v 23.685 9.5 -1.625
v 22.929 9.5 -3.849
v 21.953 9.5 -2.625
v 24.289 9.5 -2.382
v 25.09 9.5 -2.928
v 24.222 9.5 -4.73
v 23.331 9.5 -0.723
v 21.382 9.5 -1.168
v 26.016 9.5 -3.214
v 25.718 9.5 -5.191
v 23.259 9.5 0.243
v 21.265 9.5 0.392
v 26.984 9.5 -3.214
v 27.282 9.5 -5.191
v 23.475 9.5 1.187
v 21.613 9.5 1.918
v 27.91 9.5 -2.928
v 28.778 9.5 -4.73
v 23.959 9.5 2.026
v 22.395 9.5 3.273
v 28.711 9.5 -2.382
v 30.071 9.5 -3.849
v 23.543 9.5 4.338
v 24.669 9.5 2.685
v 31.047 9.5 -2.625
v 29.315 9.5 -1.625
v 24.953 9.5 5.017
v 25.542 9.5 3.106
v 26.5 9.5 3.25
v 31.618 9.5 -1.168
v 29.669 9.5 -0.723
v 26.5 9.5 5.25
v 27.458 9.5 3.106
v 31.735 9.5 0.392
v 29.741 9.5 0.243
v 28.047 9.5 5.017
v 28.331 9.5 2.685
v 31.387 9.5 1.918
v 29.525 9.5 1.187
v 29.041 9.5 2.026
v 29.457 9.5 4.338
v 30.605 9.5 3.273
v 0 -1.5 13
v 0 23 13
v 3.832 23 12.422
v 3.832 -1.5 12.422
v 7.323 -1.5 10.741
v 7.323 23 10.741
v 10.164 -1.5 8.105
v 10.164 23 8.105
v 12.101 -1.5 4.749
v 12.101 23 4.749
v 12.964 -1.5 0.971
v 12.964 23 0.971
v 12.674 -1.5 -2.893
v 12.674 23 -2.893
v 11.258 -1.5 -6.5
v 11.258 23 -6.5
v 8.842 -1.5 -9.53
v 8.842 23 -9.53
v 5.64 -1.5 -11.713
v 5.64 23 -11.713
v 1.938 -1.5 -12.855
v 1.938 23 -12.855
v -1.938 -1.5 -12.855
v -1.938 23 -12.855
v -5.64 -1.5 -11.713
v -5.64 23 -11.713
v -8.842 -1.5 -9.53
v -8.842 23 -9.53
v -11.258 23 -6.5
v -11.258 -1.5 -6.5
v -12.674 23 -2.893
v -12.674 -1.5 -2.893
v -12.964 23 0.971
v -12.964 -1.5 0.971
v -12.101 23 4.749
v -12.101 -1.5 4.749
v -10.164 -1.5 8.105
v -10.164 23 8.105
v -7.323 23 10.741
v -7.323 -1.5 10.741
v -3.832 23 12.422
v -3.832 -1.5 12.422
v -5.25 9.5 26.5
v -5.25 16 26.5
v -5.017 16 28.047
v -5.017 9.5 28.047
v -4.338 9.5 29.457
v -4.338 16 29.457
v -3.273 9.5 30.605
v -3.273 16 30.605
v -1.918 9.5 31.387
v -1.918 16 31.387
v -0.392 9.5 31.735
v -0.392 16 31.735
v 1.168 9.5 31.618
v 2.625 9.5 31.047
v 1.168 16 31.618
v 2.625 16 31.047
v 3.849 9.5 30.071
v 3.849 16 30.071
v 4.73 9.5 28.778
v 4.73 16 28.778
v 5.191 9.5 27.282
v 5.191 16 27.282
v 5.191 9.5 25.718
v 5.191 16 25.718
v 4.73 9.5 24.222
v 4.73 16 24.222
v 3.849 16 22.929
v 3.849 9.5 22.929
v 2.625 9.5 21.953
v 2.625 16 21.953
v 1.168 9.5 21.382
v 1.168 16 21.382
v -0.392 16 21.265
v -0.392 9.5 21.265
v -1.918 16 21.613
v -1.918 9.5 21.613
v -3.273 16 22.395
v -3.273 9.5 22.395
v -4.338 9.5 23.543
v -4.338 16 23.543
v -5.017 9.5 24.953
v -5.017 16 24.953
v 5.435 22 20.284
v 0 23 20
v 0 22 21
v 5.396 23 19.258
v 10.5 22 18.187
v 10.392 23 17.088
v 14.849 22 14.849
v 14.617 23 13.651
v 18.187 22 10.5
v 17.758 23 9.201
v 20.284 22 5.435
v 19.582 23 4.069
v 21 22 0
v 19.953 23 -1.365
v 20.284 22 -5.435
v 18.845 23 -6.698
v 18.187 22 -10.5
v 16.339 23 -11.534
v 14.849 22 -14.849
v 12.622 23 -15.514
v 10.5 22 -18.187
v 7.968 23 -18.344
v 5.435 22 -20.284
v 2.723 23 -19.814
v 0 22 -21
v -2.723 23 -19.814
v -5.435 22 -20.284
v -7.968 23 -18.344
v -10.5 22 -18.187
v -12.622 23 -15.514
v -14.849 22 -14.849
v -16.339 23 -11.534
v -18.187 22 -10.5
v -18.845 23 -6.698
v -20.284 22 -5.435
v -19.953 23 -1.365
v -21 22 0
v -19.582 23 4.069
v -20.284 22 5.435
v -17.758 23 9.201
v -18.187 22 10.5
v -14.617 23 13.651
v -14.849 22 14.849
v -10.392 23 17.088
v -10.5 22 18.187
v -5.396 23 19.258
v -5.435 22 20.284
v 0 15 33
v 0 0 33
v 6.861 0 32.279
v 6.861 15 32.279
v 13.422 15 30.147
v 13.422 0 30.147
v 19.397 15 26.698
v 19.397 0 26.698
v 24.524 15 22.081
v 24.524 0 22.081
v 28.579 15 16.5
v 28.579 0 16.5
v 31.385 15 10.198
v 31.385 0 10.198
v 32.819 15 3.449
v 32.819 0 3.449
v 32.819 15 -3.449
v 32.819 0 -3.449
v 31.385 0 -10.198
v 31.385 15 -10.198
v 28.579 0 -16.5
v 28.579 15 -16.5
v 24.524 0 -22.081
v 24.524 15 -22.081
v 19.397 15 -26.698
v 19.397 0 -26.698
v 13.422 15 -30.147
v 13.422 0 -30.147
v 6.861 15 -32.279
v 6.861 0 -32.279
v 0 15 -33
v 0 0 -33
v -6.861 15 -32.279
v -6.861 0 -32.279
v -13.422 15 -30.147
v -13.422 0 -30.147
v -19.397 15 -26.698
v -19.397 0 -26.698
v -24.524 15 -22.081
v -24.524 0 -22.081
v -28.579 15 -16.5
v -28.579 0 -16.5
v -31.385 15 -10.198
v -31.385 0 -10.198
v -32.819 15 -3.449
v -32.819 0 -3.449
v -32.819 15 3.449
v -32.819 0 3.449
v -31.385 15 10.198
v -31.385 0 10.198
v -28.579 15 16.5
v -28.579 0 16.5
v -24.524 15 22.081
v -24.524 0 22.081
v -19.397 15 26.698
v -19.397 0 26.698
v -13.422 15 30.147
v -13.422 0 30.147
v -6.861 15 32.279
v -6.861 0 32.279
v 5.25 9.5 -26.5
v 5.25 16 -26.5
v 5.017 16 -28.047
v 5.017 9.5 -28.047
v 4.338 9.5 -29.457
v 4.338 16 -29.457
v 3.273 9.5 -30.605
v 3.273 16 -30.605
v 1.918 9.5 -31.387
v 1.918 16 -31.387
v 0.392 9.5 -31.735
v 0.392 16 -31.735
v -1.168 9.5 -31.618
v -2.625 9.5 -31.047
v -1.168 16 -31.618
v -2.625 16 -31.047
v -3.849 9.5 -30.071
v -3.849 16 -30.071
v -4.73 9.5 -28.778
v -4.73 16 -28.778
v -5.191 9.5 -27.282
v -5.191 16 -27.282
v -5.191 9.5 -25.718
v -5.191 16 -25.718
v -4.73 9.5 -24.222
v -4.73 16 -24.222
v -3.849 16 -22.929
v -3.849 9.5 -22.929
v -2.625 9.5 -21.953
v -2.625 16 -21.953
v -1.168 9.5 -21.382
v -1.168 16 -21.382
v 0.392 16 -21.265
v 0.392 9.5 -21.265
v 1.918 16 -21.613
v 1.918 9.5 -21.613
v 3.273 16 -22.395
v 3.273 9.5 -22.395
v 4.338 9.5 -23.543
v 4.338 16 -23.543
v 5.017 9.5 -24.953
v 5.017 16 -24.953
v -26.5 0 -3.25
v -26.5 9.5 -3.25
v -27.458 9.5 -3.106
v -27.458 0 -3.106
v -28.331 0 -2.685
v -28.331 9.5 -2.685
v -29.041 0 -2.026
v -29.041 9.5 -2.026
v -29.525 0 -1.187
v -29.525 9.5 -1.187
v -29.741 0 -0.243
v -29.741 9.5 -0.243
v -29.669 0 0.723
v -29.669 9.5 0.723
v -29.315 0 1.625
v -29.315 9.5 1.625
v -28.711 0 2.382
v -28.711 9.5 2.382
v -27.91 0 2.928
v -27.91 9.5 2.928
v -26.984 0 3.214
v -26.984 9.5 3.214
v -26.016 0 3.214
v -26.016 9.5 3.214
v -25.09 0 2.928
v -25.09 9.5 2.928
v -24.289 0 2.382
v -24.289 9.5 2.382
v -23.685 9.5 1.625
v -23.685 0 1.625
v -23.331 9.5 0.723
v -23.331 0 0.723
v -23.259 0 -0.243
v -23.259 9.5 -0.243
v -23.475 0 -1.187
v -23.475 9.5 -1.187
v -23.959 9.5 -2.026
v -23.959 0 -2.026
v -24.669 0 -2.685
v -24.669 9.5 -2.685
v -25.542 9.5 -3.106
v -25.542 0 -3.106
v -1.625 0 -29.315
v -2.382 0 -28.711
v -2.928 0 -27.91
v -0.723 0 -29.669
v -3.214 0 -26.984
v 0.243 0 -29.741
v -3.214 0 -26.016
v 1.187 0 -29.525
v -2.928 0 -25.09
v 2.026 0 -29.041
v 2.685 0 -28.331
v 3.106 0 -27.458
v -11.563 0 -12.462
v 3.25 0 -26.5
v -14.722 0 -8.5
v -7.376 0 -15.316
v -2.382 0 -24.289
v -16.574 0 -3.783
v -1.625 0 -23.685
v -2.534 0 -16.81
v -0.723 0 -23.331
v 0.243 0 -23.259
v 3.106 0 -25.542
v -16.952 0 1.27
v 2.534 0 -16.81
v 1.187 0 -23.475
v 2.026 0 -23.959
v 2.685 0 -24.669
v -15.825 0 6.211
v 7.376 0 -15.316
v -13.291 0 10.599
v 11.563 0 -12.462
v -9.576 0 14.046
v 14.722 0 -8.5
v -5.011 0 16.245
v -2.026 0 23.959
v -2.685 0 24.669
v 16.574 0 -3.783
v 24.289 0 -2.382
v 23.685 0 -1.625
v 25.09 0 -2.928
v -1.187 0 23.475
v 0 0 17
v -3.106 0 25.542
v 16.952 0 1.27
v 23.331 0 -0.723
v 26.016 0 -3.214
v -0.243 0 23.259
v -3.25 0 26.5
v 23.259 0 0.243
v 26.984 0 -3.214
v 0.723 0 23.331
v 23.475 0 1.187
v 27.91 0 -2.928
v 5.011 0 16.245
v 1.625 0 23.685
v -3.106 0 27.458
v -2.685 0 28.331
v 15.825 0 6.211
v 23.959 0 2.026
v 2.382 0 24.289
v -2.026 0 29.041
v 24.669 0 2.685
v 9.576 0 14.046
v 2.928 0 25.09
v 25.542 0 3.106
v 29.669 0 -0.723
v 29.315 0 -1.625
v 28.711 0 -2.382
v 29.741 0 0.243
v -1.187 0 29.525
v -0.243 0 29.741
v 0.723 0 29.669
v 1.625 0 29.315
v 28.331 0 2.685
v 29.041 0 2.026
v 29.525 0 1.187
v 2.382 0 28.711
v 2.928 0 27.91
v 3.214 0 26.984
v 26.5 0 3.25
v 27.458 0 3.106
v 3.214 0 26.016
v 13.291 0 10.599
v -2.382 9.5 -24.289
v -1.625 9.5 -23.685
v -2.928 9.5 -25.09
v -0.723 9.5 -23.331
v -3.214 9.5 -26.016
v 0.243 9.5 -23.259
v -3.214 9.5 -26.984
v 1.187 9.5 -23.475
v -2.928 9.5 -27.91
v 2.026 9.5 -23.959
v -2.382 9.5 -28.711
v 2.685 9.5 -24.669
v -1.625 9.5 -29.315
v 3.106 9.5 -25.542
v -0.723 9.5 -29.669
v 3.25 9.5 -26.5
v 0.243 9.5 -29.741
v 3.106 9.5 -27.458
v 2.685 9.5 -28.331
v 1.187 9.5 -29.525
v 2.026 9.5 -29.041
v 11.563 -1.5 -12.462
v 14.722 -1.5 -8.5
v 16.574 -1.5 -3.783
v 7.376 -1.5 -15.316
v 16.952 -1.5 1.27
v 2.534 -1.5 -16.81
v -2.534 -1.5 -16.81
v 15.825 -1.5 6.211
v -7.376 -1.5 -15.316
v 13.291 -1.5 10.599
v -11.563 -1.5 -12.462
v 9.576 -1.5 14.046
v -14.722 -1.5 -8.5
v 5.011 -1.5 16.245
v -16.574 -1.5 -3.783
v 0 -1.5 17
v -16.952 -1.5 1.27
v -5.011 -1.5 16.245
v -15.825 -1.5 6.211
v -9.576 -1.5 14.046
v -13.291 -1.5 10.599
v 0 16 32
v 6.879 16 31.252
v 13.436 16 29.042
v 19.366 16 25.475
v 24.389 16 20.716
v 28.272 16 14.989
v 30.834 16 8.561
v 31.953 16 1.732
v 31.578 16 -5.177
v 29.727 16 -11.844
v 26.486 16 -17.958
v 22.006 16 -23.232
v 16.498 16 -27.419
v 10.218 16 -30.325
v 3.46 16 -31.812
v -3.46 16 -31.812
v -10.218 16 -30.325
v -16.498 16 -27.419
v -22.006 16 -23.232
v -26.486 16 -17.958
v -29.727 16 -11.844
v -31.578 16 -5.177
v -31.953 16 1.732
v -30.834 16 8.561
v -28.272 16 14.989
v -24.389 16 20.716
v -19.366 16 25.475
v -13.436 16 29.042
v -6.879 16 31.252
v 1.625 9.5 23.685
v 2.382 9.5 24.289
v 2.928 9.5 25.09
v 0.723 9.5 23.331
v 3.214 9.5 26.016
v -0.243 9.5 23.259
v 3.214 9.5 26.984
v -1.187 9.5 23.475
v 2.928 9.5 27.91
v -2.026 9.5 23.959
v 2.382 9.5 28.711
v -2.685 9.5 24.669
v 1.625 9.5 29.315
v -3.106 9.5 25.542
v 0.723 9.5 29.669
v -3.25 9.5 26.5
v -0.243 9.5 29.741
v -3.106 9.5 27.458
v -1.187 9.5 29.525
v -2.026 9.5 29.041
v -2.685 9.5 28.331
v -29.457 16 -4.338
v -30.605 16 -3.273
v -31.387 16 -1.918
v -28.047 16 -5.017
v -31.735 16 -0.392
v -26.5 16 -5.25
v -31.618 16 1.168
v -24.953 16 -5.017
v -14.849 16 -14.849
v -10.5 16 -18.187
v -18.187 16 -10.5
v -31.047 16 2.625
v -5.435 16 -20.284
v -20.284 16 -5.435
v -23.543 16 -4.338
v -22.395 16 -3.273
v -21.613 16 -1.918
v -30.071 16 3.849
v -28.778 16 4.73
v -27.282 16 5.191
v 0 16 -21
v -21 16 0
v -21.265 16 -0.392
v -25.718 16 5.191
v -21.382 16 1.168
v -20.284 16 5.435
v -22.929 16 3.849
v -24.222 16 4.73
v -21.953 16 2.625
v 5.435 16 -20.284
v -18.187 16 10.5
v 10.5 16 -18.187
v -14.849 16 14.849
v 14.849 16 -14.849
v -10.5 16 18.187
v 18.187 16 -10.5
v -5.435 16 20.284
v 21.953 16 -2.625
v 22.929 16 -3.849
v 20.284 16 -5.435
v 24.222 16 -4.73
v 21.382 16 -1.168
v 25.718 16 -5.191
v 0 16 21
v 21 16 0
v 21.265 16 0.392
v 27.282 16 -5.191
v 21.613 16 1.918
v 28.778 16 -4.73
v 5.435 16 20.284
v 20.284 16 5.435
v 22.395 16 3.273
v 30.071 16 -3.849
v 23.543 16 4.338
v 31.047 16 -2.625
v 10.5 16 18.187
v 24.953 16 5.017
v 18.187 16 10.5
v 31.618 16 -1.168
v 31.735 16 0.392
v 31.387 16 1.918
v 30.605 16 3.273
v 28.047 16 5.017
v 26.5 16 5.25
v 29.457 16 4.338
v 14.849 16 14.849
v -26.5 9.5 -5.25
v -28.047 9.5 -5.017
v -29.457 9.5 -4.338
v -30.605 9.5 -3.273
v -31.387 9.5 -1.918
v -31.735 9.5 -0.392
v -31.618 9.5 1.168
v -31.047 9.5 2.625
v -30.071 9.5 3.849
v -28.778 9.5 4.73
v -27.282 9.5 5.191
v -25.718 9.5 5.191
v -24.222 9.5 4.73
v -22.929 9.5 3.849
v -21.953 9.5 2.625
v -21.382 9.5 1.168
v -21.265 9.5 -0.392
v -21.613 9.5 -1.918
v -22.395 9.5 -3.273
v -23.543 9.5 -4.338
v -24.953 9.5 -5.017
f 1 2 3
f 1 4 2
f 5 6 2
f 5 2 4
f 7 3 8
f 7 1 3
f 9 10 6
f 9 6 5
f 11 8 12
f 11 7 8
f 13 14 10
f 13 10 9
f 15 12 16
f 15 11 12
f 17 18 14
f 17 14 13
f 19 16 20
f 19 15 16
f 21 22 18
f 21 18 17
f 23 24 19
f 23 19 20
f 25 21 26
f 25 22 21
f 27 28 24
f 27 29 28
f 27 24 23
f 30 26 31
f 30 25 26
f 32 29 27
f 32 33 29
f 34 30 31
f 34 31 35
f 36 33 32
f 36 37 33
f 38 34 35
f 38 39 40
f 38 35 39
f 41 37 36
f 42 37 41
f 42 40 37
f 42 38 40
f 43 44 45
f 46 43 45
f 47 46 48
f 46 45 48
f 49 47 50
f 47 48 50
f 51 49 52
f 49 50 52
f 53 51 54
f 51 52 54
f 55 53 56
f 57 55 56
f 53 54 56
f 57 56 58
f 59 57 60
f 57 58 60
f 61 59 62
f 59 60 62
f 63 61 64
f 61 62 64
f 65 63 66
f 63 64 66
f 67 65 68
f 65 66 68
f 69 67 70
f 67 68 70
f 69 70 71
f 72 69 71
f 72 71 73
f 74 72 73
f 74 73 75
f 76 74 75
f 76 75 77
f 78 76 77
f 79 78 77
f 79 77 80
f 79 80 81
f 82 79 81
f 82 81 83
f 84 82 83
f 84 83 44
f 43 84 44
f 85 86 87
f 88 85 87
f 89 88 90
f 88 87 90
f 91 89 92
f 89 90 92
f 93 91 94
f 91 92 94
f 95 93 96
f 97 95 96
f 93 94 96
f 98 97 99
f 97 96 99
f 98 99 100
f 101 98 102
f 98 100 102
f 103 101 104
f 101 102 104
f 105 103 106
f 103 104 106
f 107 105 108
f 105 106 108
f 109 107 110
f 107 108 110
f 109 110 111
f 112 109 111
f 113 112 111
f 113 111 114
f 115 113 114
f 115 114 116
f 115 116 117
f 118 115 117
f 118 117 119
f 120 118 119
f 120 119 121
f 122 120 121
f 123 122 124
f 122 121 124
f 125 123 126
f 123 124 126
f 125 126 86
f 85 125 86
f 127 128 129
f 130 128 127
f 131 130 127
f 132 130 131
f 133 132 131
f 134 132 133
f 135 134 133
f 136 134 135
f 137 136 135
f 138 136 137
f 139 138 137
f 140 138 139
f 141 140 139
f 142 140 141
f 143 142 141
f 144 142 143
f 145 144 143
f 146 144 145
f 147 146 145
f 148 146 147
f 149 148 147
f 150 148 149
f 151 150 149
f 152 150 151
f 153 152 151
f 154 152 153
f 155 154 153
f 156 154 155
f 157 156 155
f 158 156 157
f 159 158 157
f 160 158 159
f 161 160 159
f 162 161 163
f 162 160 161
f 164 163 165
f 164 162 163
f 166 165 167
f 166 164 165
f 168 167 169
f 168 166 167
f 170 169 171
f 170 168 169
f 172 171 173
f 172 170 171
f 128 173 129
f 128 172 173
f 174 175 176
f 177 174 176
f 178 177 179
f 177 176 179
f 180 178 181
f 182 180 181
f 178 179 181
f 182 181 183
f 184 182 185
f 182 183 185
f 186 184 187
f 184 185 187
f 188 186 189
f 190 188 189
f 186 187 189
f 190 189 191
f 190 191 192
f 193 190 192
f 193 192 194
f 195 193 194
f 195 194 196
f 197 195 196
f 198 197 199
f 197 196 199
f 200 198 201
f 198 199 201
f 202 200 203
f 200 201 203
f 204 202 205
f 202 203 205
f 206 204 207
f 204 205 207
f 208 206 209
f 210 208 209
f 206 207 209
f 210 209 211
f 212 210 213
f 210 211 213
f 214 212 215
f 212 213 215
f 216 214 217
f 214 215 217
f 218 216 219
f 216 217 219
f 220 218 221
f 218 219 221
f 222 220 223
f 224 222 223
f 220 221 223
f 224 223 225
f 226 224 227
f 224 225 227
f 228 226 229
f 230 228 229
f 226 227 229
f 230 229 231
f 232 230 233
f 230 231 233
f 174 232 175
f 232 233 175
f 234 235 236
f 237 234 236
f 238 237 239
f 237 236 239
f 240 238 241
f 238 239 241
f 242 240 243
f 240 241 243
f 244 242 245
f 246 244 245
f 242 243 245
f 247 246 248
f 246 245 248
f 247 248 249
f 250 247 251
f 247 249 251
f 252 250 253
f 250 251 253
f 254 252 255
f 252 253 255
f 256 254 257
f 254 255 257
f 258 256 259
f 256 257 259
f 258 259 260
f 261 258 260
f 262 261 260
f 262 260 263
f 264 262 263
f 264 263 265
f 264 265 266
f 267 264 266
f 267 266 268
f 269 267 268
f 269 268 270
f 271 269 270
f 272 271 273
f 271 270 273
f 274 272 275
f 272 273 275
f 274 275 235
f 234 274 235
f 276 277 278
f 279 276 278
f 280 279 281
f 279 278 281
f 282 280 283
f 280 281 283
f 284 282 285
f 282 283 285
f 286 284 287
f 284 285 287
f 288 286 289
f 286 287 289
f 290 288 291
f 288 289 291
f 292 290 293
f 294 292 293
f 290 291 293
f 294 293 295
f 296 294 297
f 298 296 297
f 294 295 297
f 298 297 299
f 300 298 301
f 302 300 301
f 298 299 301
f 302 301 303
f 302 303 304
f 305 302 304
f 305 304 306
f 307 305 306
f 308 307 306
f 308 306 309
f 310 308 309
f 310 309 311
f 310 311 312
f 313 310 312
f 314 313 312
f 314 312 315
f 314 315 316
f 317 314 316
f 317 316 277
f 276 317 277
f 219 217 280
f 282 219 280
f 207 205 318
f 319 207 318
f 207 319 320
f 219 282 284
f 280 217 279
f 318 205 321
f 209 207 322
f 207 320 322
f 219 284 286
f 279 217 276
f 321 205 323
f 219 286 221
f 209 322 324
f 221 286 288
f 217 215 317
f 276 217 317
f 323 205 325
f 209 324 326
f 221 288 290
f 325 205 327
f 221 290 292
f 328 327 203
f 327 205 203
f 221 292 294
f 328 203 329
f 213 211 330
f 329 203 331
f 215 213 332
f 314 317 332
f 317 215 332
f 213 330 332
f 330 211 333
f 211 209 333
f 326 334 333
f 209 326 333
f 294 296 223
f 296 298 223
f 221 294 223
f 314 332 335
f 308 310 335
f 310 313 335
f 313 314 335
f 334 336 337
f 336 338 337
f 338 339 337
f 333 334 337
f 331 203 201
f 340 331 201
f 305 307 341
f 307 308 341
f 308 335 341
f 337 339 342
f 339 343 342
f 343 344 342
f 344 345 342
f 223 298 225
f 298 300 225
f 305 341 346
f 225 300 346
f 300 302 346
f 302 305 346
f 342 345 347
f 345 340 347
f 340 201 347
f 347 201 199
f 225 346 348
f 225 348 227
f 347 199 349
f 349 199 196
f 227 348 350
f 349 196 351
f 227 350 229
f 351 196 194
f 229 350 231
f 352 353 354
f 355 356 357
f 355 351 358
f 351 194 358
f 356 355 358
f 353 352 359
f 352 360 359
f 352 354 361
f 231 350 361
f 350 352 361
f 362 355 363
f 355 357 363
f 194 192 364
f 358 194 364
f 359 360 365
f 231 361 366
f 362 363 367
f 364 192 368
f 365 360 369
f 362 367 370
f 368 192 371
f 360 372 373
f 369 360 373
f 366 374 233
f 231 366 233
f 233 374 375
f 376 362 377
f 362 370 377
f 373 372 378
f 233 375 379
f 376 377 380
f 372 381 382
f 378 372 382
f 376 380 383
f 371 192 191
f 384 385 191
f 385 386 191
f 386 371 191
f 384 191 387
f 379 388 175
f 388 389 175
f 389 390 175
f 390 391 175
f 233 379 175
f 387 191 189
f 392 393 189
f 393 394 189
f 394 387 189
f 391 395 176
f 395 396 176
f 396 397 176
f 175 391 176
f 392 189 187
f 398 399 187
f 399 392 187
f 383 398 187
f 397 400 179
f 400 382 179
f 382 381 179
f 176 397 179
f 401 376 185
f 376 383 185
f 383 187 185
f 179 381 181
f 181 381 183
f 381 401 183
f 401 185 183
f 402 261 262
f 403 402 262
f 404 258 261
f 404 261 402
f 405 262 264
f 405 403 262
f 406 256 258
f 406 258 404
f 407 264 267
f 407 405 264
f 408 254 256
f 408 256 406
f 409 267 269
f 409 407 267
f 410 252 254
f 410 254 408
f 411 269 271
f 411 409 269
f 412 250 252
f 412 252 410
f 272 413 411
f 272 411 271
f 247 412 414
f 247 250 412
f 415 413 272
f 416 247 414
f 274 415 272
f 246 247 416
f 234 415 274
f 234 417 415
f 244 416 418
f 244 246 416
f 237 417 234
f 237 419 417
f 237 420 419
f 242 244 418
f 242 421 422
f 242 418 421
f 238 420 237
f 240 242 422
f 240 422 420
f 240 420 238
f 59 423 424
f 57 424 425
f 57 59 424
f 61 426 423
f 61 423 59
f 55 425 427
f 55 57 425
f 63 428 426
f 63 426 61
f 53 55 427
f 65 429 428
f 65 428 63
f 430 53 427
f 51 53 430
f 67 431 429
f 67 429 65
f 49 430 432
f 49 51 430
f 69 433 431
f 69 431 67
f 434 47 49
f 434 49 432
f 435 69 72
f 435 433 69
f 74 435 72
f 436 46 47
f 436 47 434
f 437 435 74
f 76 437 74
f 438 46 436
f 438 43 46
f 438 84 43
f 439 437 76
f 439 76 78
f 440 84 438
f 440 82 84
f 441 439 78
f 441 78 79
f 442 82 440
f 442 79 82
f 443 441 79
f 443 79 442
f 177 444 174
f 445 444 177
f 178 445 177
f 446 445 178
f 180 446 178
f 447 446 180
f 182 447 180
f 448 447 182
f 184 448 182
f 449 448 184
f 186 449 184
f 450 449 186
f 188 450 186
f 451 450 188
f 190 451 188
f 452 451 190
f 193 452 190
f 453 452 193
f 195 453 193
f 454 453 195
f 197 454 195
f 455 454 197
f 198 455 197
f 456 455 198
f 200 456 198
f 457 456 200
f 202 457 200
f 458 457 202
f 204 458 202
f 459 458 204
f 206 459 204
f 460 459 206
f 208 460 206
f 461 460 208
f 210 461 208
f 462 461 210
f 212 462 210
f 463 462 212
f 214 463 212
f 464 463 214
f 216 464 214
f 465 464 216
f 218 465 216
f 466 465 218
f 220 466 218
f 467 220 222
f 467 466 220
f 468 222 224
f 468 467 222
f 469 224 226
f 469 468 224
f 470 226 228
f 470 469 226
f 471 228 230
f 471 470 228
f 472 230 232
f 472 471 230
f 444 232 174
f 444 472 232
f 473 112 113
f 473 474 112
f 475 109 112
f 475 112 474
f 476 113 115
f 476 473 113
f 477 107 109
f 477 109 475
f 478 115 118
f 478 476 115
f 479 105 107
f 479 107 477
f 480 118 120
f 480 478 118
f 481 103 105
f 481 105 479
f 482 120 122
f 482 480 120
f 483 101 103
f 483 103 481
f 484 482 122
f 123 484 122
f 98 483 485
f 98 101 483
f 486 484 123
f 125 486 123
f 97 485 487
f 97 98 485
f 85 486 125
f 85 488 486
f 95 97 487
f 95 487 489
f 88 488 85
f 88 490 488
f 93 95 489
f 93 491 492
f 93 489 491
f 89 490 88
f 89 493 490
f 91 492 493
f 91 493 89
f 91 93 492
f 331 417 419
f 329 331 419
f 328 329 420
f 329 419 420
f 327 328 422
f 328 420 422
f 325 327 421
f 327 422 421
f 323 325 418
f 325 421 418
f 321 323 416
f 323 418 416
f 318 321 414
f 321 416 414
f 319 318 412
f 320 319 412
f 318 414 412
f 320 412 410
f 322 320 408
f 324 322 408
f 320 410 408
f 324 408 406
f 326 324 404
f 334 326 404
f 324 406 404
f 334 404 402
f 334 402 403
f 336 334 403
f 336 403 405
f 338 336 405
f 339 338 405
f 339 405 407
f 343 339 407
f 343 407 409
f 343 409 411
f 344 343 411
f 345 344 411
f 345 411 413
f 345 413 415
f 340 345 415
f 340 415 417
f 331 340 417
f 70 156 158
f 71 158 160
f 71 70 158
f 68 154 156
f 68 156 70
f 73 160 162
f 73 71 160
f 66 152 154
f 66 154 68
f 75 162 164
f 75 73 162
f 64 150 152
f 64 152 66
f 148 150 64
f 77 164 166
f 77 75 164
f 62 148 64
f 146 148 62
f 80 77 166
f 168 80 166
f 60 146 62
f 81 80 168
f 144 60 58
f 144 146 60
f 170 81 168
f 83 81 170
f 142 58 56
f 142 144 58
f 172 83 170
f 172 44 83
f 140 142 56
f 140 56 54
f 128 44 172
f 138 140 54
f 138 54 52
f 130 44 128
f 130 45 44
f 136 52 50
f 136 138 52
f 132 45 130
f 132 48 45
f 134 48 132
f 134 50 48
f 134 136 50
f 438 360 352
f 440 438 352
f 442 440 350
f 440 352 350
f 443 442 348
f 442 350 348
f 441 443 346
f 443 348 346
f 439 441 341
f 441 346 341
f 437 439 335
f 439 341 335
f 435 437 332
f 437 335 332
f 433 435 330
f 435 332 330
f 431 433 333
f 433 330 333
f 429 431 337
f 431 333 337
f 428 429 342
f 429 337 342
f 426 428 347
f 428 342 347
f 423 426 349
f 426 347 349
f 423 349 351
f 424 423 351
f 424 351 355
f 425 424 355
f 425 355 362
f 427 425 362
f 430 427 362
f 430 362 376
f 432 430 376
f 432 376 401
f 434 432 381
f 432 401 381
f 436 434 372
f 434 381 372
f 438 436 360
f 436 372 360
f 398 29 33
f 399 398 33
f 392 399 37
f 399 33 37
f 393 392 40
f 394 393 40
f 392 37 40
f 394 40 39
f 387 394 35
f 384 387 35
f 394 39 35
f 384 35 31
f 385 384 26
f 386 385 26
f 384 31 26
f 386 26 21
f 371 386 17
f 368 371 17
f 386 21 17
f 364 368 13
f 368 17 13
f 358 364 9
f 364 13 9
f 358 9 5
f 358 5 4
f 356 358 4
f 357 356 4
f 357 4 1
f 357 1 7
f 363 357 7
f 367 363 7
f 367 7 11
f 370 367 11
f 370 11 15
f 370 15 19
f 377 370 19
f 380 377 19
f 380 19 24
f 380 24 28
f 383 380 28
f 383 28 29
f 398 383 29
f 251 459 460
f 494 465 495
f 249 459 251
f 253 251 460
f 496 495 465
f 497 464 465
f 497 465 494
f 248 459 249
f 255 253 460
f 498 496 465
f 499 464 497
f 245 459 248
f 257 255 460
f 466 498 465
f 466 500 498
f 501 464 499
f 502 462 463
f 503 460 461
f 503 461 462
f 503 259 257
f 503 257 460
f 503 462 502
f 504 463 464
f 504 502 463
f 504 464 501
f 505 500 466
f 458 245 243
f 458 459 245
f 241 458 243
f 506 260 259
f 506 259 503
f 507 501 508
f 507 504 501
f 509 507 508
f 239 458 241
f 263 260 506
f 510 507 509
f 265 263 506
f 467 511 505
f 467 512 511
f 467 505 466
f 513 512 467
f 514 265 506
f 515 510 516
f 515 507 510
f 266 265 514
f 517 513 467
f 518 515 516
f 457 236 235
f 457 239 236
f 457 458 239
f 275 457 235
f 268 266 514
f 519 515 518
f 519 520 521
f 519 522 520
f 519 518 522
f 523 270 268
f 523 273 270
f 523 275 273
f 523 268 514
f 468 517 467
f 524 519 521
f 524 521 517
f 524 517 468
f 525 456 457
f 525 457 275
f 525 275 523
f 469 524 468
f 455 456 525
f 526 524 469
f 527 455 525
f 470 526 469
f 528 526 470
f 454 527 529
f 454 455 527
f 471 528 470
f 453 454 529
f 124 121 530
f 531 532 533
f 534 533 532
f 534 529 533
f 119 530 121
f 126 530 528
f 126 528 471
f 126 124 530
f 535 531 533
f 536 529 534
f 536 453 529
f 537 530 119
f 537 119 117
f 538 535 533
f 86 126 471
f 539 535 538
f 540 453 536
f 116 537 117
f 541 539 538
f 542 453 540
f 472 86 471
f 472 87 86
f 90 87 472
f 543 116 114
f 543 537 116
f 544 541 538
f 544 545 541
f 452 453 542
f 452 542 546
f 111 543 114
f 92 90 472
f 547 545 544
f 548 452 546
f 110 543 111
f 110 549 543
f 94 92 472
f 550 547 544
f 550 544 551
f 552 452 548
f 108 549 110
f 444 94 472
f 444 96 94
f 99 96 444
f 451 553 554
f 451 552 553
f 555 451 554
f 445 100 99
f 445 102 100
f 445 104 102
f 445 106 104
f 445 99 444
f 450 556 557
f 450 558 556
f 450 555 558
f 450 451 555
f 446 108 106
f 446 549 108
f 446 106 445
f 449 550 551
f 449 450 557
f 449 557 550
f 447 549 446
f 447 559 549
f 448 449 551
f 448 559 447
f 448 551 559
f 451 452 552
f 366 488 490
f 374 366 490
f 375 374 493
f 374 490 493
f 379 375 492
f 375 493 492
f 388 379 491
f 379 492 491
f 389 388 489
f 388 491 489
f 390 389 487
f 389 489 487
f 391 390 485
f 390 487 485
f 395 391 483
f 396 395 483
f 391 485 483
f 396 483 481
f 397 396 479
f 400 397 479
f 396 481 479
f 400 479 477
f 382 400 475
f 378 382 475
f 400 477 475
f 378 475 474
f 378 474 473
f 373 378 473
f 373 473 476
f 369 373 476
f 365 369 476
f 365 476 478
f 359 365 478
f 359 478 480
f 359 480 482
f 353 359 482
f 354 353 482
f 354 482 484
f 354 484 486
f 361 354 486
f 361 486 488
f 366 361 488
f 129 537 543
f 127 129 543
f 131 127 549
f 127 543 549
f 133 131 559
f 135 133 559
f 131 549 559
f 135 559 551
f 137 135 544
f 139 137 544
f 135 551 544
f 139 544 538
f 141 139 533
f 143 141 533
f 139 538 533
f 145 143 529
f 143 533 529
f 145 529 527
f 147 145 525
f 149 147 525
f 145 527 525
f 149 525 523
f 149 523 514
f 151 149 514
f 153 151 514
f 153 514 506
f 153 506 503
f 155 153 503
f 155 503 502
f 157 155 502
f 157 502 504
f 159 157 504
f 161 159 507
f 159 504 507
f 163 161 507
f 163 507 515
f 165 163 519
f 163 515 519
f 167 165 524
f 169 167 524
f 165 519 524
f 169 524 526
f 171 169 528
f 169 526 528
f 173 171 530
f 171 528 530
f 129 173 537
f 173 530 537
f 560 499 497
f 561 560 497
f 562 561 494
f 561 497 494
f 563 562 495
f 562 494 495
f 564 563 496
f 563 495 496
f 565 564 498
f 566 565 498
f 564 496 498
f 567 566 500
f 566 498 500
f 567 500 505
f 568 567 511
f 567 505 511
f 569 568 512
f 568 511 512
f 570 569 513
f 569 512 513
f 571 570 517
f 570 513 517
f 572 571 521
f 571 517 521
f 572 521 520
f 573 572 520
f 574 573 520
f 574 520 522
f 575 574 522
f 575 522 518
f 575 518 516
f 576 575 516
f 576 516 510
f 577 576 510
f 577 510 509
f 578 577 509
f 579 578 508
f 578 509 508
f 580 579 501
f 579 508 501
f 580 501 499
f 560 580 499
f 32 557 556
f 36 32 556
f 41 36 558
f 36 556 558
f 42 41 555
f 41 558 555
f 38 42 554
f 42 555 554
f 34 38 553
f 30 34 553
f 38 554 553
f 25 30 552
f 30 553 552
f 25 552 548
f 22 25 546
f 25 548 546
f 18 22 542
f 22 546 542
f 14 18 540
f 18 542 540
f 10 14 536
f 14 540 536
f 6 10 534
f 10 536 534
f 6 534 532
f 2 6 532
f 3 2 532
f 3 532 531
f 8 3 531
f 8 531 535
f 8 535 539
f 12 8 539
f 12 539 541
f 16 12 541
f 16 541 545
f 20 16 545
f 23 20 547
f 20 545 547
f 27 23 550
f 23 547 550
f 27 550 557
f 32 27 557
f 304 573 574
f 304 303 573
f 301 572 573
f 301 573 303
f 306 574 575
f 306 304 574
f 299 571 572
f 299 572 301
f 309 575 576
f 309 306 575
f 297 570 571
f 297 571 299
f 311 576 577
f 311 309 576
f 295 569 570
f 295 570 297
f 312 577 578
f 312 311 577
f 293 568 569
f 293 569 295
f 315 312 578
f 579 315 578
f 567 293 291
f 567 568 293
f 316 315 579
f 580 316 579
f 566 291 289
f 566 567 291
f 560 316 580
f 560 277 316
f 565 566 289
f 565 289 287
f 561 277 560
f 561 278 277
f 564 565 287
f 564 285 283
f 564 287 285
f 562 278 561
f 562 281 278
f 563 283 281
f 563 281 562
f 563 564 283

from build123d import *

# Parameters (mm, degrees)
CROQUIS1_R              = 33
SALIENTE_EXTRUIR1_DEPTH = 16
CROQUIS2_R              = 21
SALIENTE_EXTRUIR2_DEPTH = 7
CROQUIS3_R              = 17
SALIENTE_EXTRUIR3_DEPTH = 1.5
CROQUIS4_R              = 13
CORTAR_EXTRUIR1_DEPTH   = 53.709107372
CHAFL_N1_SIZE           = 1
CROQUIS5_R              = 5.25
CORTAR_EXTRUIR2_DEPTH   = 6.5
CROQUIS6_R              = 3.25
CORTAR_EXTRUIR3_DEPTH   = 49.582404222
MATRIZC1_COUNT          = 4
CHAFL_N2_SIZE           = 1


with BuildPart() as part:
    # Croquis1 → Saliente-Extruir1 (new body)
    with BuildSketch(Plane(origin=(0, 0, 0), x_dir=(1, 0, 0), z_dir=(0, 1, 0))):
        with Locations(Location((0, 0, 0), (0, 0, 270))):
            Circle(CROQUIS1_R)
    extrude(amount=SALIENTE_EXTRUIR1_DEPTH)

    # Croquis2 → Saliente-Extruir2 (add)
    with BuildSketch(Plane(origin=(0, 16, 0), x_dir=(1, 0, 0), z_dir=(0, 1, 0))):
        with Locations(Location((0, 0, 0), (0, 0, 270))):
            Circle(CROQUIS2_R)
    extrude(amount=SALIENTE_EXTRUIR2_DEPTH)

    # Croquis3 → Saliente-Extruir3 (add)
    with BuildSketch(Plane.XZ):
        with Locations(Location((0, 0, 0), (0, 0, 90))):
            Circle(CROQUIS3_R)
    extrude(amount=SALIENTE_EXTRUIR3_DEPTH)

    # Croquis4 → Cortar-Extruir1 (cut, through all)
    with BuildSketch(Plane(origin=(0, 23, 0), x_dir=(1, 0, 0), z_dir=(0, 1, 0))):
        with Locations(Location((0, 0, 0), (0, 0, 270))):
            Circle(CROQUIS4_R)
    extrude(amount=-CORTAR_EXTRUIR1_DEPTH, mode=Mode.SUBTRACT)

    # Chaflán1
    chafl_n1_edges = [part.edges().sort_by_distance(p)[0] for p in [
        (0, 16, -33),
    ]]
    chamfer(chafl_n1_edges, length=CHAFL_N1_SIZE)

    # Croquis5 → Cortar-Extruir2 (cut)
    with BuildSketch(Plane(origin=(0, 16, 0), x_dir=(1, 0, 0), z_dir=(0, 1, 0))):
        with Locations(Location((26.5, 0, 0), (0, 0, 270))):
            Circle(CROQUIS5_R)
    cortar_extruir2 = extrude(amount=-CORTAR_EXTRUIR2_DEPTH, mode=Mode.SUBTRACT)

    # Croquis6 → Cortar-Extruir3 (cut, through all)
    with BuildSketch(Plane(origin=(0, 9.5, 0), x_dir=(1, 0, 0), z_dir=(0, 1, 0))):
        with Locations(Location((26.5, 0, 0), (0, 0, 270))):
            Circle(CROQUIS6_R)
    cortar_extruir3 = extrude(amount=-CORTAR_EXTRUIR3_DEPTH, mode=Mode.SUBTRACT)

    # MatrizC1: Cortar-Extruir2, Cortar-Extruir3 ×4 about axis
    matrizc1_axis = Axis((0, 0, 0), (0, 1, 0))
    add([cortar_extruir2.rotate(matrizc1_axis, i * 360 / MATRIZC1_COUNT) for i in range(1, MATRIZC1_COUNT)], mode=Mode.SUBTRACT)
    add([cortar_extruir3.rotate(matrizc1_axis, i * 360 / MATRIZC1_COUNT) for i in range(1, MATRIZC1_COUNT)], mode=Mode.SUBTRACT)

    # Chaflán2
    chafl_n2_edges = [part.edges().sort_by_distance(p)[0] for p in [
        (0, 23, -21),
    ]]
    chamfer(chafl_n2_edges, length=CHAFL_N2_SIZE)


solid = part.part
